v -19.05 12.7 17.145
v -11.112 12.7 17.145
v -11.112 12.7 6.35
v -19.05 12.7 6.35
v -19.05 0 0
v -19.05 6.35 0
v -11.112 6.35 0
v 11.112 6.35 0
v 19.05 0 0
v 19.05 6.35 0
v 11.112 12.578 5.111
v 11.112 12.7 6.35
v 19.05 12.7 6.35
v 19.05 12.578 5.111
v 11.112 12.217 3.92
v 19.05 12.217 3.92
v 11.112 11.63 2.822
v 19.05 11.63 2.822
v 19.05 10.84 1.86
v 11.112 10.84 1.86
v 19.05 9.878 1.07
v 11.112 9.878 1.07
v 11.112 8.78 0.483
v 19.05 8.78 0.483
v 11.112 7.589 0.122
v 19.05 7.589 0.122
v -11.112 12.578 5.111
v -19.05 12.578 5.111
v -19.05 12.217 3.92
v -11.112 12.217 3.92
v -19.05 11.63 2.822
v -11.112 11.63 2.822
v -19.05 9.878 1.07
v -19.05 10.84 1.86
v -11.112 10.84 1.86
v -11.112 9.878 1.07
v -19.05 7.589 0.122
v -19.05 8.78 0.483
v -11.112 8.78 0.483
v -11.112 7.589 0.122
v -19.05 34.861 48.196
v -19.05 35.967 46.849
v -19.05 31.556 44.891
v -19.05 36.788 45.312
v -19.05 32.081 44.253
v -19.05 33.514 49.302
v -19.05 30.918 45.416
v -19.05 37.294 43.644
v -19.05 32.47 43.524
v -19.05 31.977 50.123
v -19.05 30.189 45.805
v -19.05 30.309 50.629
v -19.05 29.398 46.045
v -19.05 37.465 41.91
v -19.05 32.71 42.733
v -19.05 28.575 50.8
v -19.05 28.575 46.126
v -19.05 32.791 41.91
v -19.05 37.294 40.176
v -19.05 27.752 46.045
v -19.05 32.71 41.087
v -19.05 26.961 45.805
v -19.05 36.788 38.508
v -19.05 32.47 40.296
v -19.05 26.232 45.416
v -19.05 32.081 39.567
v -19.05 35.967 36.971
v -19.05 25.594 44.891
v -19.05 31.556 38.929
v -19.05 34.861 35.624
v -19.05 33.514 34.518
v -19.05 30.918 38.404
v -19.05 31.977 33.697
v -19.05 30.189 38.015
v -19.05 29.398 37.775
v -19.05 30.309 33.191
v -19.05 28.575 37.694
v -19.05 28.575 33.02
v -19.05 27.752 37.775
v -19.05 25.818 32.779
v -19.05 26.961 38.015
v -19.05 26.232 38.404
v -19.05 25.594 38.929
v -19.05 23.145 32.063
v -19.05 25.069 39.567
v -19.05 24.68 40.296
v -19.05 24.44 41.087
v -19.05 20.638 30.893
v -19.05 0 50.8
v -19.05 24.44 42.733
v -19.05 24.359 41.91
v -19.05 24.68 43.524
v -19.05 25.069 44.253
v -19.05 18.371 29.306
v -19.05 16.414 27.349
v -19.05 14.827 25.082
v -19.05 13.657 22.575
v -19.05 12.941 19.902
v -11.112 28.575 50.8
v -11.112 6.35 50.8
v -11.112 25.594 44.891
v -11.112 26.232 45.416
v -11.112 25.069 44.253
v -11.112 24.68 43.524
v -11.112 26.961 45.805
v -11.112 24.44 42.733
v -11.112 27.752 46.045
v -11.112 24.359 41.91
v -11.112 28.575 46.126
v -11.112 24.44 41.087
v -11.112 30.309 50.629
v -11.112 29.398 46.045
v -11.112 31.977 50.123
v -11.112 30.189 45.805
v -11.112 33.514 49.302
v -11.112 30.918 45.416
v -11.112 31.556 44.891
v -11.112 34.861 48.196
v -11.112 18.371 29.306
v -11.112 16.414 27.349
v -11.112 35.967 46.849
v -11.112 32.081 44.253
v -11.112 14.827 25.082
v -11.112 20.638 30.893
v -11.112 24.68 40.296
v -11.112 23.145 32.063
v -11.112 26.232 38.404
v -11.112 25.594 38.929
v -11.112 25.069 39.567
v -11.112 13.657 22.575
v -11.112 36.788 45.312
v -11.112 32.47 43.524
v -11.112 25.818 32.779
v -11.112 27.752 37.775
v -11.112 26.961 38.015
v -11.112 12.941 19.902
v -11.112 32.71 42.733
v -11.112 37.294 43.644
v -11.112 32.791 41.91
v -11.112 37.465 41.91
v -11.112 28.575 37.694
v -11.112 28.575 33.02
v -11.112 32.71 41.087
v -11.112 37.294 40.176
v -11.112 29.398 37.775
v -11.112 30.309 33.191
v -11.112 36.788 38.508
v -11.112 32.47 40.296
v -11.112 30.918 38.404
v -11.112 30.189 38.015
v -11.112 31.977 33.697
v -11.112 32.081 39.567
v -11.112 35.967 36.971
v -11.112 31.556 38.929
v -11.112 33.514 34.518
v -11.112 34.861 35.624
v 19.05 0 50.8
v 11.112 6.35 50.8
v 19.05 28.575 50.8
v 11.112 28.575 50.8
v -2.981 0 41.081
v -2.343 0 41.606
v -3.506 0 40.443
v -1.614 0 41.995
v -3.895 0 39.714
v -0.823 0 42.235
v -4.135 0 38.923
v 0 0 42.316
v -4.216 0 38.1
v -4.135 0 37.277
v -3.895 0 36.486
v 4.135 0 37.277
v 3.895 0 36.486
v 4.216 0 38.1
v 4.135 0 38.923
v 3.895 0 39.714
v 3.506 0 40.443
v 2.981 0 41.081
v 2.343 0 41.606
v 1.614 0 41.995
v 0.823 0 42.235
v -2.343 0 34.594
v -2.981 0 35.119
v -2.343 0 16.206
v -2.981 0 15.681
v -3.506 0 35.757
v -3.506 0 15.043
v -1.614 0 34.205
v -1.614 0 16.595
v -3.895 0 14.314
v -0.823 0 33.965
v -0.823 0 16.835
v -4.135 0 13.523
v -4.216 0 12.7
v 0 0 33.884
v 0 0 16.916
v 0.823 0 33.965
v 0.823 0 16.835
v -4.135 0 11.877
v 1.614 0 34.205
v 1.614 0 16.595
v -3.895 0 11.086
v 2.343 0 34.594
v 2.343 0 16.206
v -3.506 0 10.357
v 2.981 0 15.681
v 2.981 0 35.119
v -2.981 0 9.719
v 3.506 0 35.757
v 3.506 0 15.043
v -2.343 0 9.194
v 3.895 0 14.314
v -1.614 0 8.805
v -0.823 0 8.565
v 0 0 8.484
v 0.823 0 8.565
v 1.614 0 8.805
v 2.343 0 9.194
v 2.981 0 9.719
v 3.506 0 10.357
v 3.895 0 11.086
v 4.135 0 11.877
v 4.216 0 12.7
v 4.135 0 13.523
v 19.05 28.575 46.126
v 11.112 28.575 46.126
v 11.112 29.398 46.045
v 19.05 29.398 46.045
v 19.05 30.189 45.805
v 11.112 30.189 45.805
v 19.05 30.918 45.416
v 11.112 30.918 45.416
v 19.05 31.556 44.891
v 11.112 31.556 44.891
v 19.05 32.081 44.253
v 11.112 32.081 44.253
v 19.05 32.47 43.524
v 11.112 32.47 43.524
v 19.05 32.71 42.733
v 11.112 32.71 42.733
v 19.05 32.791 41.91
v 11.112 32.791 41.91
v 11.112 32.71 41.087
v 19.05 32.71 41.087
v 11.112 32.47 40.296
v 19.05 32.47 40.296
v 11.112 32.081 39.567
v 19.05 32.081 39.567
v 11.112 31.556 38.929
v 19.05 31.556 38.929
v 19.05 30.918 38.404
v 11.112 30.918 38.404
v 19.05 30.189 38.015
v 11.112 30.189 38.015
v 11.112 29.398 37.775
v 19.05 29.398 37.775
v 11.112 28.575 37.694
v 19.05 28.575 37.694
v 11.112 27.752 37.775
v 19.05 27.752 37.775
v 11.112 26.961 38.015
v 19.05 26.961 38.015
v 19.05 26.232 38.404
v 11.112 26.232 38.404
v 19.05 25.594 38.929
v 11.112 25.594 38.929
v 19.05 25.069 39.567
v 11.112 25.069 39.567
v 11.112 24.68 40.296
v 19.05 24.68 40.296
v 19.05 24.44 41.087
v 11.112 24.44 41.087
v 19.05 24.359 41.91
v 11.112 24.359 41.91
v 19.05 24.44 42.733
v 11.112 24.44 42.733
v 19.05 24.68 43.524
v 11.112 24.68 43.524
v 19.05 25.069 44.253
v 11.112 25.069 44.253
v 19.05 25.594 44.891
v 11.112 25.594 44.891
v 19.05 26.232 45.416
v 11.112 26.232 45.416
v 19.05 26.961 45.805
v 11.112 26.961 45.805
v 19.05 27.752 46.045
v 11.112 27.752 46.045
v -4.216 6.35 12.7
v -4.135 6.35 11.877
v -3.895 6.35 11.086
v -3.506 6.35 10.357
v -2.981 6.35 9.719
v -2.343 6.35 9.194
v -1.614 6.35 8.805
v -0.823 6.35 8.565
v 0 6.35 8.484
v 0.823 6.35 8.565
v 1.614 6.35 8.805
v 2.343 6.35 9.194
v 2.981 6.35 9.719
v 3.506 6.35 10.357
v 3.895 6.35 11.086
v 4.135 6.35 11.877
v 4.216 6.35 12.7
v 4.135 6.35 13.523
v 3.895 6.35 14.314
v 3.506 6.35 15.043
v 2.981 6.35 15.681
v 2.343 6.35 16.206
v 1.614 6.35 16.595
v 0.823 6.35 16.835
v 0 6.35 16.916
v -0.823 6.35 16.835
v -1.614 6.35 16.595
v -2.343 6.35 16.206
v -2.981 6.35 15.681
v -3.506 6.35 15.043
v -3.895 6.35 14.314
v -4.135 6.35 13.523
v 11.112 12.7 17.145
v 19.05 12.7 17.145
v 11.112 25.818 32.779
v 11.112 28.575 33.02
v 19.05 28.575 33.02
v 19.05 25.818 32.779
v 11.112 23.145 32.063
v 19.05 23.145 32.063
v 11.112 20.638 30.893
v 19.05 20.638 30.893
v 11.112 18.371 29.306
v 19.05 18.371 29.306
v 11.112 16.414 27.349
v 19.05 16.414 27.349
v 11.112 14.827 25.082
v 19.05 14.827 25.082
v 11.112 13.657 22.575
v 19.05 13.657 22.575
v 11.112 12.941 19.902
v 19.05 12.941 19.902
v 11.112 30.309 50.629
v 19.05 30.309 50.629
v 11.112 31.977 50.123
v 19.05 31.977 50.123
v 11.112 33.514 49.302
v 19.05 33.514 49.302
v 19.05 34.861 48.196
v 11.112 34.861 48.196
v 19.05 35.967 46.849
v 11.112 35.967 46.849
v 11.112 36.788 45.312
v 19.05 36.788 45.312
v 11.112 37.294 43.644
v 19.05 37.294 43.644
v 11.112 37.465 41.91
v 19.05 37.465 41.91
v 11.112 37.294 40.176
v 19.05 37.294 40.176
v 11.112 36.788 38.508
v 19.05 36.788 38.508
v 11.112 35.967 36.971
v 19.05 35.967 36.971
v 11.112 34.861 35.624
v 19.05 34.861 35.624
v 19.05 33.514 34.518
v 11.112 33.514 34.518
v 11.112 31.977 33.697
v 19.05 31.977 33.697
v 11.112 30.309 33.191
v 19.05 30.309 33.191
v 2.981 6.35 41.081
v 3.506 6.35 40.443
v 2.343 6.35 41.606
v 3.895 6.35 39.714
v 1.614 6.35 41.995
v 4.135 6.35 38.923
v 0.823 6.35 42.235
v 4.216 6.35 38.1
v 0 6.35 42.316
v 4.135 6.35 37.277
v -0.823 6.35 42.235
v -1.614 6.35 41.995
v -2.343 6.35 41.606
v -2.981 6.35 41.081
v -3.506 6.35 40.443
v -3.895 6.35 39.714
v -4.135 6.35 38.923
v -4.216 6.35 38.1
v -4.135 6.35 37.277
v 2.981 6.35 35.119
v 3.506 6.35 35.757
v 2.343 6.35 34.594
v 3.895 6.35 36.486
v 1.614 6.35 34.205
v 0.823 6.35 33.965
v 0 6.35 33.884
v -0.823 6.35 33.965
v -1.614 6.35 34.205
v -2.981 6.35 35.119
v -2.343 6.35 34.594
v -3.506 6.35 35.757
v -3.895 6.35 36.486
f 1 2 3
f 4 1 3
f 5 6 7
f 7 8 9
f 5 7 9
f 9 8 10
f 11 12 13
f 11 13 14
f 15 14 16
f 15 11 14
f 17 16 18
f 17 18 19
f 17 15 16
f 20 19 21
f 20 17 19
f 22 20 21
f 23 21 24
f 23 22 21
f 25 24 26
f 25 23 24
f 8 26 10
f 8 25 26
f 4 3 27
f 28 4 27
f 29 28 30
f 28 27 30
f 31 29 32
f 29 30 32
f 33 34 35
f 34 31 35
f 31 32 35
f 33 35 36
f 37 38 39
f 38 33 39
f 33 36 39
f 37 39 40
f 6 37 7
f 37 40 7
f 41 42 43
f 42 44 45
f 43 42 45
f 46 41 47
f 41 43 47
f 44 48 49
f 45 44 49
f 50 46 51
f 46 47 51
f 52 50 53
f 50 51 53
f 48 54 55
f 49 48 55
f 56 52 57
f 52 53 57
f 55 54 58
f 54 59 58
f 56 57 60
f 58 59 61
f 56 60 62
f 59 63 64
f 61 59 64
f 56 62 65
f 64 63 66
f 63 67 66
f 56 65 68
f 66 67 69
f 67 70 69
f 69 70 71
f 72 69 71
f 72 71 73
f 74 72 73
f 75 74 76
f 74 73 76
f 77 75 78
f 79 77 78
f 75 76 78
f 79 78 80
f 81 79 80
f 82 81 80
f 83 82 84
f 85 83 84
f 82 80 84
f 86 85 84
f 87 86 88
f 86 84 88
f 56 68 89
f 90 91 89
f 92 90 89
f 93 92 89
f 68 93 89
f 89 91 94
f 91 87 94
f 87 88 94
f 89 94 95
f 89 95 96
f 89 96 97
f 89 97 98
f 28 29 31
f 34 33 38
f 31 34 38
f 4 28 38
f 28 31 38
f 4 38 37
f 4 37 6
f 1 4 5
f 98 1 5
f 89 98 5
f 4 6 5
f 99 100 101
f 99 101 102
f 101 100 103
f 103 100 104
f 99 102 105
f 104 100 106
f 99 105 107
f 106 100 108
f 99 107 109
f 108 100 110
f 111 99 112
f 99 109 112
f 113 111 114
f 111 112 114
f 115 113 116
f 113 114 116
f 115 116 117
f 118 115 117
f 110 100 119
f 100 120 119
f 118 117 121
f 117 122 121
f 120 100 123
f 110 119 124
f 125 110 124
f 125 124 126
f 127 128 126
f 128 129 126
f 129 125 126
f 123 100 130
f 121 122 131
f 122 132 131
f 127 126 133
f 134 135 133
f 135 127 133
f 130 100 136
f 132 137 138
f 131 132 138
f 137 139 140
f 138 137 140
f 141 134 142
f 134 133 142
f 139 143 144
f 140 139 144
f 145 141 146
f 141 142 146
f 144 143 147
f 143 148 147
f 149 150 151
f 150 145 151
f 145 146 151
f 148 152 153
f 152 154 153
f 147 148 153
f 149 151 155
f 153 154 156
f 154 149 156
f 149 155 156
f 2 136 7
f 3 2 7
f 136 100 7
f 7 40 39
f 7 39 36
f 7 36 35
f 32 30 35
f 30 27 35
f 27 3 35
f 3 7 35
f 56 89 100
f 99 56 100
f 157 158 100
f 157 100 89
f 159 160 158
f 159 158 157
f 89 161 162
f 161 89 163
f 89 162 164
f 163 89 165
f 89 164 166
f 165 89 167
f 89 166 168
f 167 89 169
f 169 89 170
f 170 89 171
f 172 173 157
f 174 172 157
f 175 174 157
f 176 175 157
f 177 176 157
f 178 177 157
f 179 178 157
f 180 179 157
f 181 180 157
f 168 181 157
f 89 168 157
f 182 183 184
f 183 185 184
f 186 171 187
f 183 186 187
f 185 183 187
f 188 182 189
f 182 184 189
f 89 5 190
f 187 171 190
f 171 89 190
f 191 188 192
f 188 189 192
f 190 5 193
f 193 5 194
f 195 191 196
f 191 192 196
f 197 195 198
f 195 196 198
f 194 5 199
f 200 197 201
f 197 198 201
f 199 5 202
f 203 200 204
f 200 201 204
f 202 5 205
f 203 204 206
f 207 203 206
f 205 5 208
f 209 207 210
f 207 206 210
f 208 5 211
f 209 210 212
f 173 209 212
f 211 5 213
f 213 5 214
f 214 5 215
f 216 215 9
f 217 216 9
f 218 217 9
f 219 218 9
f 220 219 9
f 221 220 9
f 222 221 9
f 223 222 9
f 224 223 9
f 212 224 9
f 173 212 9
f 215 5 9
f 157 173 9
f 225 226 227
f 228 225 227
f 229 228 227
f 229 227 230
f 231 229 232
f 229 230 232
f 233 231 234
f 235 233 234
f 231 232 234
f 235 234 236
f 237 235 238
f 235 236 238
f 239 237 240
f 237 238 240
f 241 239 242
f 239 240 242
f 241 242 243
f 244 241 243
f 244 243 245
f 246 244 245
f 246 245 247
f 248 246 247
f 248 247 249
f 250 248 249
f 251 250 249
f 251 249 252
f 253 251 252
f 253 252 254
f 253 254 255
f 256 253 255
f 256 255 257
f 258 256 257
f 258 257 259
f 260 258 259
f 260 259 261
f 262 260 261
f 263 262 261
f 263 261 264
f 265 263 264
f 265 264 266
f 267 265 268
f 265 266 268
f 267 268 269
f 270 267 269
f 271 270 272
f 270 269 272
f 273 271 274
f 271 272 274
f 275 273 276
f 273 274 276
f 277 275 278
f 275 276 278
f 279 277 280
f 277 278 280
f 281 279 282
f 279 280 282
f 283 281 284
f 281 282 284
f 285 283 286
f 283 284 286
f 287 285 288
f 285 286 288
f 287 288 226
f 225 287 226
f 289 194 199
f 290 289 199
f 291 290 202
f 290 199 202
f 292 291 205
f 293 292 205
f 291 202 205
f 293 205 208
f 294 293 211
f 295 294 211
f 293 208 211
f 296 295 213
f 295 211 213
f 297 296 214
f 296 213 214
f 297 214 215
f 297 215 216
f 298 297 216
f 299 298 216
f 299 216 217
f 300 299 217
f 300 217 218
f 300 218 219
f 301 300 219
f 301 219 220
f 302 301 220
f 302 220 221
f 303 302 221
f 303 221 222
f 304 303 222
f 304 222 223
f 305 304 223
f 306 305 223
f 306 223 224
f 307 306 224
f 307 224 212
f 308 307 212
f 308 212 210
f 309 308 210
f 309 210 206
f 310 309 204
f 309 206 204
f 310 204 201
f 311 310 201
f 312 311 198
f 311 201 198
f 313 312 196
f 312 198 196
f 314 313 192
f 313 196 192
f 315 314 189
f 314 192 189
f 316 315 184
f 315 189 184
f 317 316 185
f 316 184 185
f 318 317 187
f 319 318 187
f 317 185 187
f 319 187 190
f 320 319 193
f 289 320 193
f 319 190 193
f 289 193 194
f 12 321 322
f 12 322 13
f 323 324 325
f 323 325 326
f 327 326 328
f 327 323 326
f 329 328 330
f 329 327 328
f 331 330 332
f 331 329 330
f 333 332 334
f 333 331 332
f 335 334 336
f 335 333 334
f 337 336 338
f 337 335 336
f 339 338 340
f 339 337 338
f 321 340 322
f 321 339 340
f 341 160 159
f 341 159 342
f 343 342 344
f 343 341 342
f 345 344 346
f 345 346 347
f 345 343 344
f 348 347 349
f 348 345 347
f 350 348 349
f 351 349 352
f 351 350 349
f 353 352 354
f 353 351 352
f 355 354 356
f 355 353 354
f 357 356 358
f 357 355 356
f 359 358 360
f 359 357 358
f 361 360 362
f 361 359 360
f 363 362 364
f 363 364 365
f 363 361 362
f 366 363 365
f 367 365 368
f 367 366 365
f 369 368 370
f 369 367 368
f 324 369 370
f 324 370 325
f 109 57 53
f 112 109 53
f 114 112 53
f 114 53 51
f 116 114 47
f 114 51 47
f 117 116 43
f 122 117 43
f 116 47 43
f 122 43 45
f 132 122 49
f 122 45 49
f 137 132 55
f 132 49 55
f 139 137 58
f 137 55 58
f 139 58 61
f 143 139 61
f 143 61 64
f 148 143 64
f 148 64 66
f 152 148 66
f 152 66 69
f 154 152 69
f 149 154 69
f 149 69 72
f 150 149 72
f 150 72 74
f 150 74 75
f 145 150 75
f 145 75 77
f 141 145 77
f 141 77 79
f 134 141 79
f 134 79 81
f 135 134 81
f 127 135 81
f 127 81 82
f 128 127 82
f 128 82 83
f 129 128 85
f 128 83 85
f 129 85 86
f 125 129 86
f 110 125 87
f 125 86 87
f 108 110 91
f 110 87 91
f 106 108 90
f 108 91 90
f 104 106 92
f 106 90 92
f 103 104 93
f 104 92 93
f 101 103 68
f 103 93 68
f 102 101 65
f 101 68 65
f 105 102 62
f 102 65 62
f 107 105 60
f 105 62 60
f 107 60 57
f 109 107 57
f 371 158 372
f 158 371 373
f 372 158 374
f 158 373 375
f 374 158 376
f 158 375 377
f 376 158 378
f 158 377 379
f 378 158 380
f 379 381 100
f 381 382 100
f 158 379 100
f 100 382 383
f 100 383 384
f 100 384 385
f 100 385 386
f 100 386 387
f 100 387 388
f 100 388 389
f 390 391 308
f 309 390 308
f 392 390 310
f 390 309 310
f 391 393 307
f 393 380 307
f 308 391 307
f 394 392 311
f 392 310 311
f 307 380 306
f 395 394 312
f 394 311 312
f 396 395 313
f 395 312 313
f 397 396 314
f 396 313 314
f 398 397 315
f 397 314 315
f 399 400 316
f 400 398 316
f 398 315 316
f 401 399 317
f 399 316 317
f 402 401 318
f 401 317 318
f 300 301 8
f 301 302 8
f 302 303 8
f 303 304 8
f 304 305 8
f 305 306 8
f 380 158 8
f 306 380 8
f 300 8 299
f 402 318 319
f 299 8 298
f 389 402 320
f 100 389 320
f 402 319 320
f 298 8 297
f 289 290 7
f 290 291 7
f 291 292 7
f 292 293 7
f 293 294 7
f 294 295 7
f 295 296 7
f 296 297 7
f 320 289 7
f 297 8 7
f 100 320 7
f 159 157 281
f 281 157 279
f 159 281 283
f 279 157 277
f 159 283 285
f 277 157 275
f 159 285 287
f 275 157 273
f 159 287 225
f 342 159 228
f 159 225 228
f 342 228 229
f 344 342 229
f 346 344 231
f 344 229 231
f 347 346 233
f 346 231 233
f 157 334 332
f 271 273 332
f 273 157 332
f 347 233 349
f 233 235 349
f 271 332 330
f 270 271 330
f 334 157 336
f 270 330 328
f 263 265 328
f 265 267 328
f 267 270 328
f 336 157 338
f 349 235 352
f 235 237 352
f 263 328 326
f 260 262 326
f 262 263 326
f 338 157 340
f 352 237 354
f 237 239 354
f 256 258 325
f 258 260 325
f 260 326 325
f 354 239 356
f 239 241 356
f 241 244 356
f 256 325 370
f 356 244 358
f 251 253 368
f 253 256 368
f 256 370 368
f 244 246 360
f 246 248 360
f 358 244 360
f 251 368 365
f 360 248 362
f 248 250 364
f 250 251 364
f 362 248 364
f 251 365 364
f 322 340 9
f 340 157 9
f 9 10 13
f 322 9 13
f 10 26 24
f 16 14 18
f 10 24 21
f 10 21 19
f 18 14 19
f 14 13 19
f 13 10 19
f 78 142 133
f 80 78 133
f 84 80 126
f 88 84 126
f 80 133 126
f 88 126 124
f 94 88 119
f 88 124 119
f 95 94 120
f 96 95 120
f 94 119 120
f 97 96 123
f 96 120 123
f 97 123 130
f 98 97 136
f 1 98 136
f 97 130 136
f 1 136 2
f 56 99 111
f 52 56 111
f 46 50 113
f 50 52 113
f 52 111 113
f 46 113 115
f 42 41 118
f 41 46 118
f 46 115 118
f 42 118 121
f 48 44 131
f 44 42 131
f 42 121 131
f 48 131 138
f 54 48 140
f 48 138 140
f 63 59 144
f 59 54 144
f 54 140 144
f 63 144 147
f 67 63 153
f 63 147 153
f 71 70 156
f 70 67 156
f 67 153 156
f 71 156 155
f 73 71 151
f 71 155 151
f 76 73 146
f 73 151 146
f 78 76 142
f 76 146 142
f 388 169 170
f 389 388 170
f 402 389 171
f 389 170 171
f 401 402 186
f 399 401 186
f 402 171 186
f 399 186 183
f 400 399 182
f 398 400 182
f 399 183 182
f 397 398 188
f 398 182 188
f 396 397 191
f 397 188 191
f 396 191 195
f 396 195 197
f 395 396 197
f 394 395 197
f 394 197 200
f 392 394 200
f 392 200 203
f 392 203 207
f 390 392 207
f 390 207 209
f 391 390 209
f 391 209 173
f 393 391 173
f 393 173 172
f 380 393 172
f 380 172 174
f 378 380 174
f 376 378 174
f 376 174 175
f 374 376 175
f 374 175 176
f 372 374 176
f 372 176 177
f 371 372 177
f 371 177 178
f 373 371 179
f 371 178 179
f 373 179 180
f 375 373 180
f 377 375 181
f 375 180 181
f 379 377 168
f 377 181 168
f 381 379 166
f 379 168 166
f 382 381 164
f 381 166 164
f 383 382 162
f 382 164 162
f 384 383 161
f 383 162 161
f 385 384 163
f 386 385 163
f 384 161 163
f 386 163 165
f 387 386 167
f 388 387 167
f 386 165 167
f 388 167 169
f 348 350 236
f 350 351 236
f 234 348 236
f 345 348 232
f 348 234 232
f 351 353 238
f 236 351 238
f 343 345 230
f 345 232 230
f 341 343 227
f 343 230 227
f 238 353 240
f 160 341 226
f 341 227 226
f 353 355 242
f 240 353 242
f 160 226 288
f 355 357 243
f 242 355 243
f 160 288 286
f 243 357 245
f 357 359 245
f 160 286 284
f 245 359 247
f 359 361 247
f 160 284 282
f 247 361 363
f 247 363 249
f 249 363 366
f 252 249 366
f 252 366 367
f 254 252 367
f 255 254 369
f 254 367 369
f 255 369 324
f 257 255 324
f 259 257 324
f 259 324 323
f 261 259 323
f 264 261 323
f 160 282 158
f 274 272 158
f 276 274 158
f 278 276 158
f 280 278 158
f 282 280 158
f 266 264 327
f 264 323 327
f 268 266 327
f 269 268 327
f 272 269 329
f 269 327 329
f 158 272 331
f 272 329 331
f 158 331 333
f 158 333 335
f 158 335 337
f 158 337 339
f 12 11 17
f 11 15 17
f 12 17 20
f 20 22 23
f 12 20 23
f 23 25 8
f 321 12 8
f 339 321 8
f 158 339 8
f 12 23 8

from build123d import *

# Parameters (mm, degrees)
BOSS_EXTRUDE1_DEPTH      = 50.8
F_5_16_CLEARANCE_HOLE3_D = 8.4328
CUT_EXTRUDE2_DEPTH       = 20.05
CUT_EXTRUDE2_DEPTH_BACK  = 20.05
F_5_16_CLEARANCE_HOLE2_D = 8.4328


with BuildPart() as part:
    # Sketch1 → Boss-Extrude1 (new body)
    with BuildSketch(Plane.XY):
        Polygon((-19.05, 0), (19.05, 0), (19.05, 50.8), (11.1125, 50.8), (11.1125, 6.35), (-11.1125, 6.35), (-11.1125, 50.8), (-19.05, 50.8), align=None)
    extrude(amount=BOSS_EXTRUDE1_DEPTH)

    # 5/16 Clearance Hole3 (through all)
    with Locations(Plane(origin=(0, 6.35, 0), x_dir=(1, 0, 0), z_dir=(0, 1, 0))):
        with Locations((0, -38.1), (0, -12.7)):
            Hole(F_5_16_CLEARANCE_HOLE3_D / 2)

    # Sketch18 → Cut-Extrude2 (cut, two sides)
    with BuildSketch(Plane(origin=(0, 0, 0), x_dir=(0, 0, -1), z_dir=(1, 0, 0))) as cut_extrude2_sk:
        with BuildLine():
            Line((0, 50.8), (-50.8, 50.8))
            Line((-50.8, 50.8), (-50.8, 28.575))
            ThreePointArc((-50.8, 28.575), (-41.91, 37.465), (-33.02, 28.575))
            ThreePointArc((-33.02, 28.575), (-28.370320151, 17.349679849), (-17.145, 12.7))
            Line((-17.145, 12.7), (-6.35, 12.7))
            ThreePointArc((-6.35, 12.7), (-1.859871939, 10.840128061), (0, 6.35))
            Line((0, 6.35), (0, 50.8))
        make_face()
    extrude(amount=CUT_EXTRUDE2_DEPTH, mode=Mode.SUBTRACT)
    extrude(cut_extrude2_sk.sketch, amount=-CUT_EXTRUDE2_DEPTH_BACK, mode=Mode.SUBTRACT)

    # 5/16 Clearance Hole2 (through all)
    with Locations(Plane(origin=(19.05, 0, 0), x_dir=(0, 0, -1), z_dir=(1, 0, 0))):
        with Locations((-41.91, 28.575)):
            Hole(F_5_16_CLEARANCE_HOLE2_D / 2)


solid = part.part
